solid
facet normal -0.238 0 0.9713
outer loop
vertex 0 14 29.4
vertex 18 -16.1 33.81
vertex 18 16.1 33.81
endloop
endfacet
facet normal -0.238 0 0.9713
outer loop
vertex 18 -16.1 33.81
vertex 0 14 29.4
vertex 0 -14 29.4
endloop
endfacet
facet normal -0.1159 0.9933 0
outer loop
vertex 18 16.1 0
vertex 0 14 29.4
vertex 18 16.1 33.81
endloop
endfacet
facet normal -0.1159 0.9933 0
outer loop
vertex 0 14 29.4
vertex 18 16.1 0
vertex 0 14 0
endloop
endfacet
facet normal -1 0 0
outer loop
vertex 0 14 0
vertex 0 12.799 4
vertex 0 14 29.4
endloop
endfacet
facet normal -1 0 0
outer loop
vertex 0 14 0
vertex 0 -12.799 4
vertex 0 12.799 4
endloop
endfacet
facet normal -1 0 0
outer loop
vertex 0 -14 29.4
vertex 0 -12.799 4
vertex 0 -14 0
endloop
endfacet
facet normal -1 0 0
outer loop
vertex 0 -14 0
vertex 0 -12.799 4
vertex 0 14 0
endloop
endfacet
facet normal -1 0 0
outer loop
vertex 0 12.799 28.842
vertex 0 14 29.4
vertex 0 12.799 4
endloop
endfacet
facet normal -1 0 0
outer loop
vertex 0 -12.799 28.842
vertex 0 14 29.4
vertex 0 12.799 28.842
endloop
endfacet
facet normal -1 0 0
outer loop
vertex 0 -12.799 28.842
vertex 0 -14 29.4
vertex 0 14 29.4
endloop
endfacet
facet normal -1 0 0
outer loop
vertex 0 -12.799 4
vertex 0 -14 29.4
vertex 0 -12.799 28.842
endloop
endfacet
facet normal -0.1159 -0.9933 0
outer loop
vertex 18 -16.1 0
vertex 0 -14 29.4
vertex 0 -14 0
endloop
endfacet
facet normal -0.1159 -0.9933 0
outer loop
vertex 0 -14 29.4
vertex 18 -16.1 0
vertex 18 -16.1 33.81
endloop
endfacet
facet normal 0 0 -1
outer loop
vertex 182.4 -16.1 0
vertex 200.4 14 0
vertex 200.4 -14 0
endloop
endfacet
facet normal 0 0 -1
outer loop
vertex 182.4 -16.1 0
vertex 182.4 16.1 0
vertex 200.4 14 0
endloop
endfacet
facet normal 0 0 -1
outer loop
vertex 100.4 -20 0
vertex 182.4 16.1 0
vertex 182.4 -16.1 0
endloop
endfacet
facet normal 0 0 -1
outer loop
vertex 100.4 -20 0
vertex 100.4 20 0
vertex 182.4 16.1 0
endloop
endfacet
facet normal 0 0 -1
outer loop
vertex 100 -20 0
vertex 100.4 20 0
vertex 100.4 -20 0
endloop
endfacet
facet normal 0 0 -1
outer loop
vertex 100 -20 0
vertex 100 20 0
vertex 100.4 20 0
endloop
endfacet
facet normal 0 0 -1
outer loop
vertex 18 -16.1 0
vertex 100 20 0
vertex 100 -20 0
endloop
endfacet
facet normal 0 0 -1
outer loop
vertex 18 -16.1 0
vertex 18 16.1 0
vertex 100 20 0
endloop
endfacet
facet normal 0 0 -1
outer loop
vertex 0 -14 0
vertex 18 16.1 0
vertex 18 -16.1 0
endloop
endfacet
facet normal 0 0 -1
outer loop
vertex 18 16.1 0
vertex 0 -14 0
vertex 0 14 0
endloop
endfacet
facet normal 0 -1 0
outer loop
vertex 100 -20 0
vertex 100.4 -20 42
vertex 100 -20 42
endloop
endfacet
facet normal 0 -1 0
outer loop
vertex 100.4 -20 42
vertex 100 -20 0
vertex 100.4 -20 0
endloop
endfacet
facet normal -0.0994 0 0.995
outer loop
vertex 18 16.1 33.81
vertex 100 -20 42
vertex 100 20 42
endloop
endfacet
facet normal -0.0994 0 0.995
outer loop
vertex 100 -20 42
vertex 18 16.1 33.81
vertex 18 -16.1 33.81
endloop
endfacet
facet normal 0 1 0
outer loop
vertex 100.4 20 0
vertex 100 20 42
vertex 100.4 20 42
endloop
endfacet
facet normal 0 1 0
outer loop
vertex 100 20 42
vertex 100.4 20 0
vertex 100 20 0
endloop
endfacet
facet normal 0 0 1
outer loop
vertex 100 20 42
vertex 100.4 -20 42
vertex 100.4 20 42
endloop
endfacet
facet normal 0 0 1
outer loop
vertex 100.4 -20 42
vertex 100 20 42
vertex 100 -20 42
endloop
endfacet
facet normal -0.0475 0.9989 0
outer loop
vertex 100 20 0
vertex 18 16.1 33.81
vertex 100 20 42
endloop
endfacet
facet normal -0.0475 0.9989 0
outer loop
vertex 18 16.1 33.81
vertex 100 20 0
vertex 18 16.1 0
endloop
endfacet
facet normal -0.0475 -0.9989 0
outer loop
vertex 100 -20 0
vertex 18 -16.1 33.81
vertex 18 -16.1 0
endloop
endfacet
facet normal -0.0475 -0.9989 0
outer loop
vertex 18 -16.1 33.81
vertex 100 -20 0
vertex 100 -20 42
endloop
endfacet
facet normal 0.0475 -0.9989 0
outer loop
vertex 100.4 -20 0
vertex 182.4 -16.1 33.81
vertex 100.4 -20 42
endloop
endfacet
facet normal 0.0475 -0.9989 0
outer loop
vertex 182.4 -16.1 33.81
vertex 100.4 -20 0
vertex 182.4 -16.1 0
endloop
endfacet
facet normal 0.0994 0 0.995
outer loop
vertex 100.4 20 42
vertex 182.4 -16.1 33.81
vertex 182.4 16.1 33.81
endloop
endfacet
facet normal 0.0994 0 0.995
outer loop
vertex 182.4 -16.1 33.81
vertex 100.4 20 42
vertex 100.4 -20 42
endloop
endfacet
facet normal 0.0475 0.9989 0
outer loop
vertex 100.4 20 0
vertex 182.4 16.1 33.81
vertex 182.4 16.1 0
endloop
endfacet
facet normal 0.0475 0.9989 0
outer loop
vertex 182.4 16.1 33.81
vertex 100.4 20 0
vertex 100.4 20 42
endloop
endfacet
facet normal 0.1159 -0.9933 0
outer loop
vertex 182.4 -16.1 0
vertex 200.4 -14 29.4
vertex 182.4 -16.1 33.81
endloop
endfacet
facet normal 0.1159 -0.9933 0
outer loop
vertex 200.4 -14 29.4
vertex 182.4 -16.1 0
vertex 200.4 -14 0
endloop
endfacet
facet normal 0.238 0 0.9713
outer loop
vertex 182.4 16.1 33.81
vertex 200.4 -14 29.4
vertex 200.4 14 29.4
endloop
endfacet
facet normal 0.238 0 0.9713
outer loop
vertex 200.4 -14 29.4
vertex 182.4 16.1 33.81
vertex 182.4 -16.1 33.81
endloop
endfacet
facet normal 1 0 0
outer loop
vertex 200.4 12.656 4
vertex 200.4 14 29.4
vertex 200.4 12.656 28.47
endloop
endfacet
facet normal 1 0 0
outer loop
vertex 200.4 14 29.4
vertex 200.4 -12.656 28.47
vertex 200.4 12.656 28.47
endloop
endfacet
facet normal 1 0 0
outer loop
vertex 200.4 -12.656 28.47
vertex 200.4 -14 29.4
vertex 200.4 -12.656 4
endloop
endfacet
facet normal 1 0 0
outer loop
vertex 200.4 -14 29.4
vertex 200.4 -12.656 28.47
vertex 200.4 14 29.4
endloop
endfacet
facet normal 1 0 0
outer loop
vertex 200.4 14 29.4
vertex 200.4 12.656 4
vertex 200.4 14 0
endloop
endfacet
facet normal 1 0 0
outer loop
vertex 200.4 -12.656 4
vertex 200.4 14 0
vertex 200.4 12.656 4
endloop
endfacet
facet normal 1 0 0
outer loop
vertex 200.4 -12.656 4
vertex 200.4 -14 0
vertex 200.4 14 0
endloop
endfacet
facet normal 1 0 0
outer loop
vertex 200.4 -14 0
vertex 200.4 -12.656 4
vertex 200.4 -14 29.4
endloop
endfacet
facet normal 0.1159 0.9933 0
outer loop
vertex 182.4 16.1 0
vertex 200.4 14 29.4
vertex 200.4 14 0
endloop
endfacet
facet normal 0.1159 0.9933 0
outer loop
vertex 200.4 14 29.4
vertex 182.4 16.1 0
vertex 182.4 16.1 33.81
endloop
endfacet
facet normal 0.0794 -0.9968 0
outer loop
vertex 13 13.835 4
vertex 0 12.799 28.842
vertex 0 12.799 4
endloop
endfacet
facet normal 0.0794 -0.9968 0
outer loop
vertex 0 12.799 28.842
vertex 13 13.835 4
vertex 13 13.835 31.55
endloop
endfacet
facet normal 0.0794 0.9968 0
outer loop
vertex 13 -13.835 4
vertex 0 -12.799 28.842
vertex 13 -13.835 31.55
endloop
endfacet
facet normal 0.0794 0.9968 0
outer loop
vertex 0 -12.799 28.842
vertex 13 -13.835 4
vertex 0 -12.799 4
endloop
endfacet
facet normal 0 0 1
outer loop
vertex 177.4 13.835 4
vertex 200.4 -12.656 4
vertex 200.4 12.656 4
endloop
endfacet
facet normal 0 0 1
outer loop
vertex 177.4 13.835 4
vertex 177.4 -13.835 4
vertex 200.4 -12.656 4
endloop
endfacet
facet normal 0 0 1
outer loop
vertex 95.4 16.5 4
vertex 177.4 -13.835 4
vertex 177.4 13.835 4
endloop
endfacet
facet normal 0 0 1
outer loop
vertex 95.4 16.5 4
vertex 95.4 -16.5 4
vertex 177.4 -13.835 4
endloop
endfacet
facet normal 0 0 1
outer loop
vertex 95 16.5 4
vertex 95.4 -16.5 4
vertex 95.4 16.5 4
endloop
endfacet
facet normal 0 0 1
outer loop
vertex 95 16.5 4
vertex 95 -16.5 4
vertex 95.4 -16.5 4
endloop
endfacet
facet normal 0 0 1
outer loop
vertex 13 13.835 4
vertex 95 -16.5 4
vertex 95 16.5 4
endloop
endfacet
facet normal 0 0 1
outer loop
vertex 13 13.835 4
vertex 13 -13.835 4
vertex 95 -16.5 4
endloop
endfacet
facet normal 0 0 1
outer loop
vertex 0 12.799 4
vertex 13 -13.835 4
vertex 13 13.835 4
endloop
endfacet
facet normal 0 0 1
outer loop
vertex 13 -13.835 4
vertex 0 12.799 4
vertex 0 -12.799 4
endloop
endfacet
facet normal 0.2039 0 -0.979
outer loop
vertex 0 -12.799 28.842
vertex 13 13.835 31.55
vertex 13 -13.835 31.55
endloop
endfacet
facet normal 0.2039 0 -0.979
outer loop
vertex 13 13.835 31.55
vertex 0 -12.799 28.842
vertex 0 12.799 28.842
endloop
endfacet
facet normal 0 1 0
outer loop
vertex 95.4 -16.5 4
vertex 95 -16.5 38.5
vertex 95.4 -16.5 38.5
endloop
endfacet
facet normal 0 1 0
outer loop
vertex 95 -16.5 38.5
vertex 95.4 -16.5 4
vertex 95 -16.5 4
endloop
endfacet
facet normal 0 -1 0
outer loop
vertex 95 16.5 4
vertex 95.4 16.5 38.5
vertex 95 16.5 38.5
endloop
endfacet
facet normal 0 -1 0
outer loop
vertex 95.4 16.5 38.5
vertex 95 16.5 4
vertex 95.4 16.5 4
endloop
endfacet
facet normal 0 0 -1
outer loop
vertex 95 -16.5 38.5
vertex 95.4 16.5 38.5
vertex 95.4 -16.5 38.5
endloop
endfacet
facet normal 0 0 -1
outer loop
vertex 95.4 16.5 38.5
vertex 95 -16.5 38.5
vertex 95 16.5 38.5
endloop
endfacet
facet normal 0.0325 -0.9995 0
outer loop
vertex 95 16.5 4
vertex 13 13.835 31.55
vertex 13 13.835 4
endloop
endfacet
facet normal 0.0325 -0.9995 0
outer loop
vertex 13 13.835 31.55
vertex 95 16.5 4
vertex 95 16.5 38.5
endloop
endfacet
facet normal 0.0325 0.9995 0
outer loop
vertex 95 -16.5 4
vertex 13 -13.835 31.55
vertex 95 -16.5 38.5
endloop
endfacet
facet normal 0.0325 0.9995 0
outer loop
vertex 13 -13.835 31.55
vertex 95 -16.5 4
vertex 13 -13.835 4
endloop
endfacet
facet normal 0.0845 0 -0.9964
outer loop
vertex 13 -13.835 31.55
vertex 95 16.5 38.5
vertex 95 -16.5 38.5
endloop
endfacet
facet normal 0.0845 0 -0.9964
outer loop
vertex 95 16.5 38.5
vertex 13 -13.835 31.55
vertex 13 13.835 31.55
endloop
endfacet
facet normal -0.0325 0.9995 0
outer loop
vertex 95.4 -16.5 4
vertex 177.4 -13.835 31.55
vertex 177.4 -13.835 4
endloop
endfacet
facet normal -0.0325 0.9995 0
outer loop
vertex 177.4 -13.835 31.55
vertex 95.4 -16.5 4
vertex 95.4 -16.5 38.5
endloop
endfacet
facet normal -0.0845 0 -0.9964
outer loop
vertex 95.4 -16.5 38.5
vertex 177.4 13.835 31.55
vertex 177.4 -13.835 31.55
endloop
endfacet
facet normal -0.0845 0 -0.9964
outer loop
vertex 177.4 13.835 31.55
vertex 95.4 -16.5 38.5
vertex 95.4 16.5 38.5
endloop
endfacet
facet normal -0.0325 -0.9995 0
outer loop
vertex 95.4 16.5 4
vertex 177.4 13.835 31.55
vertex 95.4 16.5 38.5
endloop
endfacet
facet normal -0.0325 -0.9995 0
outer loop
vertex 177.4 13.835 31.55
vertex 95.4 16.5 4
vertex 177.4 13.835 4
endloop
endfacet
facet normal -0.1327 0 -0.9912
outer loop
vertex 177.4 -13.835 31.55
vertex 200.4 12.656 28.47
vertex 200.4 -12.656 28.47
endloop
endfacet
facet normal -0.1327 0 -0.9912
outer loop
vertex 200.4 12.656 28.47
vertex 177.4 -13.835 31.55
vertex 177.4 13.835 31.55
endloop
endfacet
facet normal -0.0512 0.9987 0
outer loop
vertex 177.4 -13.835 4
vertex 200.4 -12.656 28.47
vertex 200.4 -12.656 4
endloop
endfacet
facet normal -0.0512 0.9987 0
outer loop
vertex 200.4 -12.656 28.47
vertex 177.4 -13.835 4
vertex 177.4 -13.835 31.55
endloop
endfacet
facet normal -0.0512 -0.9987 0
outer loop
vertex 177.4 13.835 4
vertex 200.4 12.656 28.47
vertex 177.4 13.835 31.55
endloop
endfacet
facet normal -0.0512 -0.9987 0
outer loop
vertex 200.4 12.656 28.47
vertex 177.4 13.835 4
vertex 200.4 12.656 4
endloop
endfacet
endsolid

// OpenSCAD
$fn = 32;

// ----------------------------------------------------------------------
// Faired channel: 200 x 40 x 42 mm, 3.5 mm walls, faired ends
// ----------------------------------------------------------------------

// --- parameters (mm) ---
length = 200;             // channel length
width = 40;               // channel width at mid length
height = 42;              // channel height at mid length
wall = 3.5;               // side wall thickness
floor_t = 4;              // floor thickness
end_w = 28;               // faired end width
end_h = 29.4;             // faired end height

difference() {
  union() {
    hull() {
      translate([0, -14, 0]) cube([0.4, 28, 29.4]);
      translate([18, -16.1, 0]) cube([0.4, 32.2, 33.81]);
    }
    hull() {
      translate([18, -16.1, 0]) cube([0.4, 32.2, 33.81]);
      translate([100, -20, 0]) cube([0.4, 40, 42]);
    }
    hull() {
      translate([100, -20, 0]) cube([0.4, 40, 42]);
      translate([182, -16.1, 0]) cube([0.4, 32.2, 33.81]);
    }
    hull() {
      translate([182, -16.1, 0]) cube([0.4, 32.2, 33.81]);
      translate([200, -14, 0]) cube([0.4, 28, 29.4]);
    }
  }
  /* cavity, 5 mm proud of both ends so the ports are cut clean */
  hull() {
    translate([-5, -12.4, 4]) cube([0.4, 24.8, 23.8]);
    translate([13, -13.835, 4]) cube([0.4, 27.67, 27.55]);
  }
  hull() {
    translate([13, -13.835, 4]) cube([0.4, 27.67, 27.55]);
    translate([95, -16.5, 4]) cube([0.4, 33, 34.5]);
  }
  hull() {
    translate([95, -16.5, 4]) cube([0.4, 33, 34.5]);
    translate([177, -13.835, 4]) cube([0.4, 27.67, 27.55]);
  }
  hull() {
    translate([177, -13.835, 4]) cube([0.4, 27.67, 27.55]);
    translate([205, -12.4, 4]) cube([0.4, 24.8, 23.8]);
  }
}
